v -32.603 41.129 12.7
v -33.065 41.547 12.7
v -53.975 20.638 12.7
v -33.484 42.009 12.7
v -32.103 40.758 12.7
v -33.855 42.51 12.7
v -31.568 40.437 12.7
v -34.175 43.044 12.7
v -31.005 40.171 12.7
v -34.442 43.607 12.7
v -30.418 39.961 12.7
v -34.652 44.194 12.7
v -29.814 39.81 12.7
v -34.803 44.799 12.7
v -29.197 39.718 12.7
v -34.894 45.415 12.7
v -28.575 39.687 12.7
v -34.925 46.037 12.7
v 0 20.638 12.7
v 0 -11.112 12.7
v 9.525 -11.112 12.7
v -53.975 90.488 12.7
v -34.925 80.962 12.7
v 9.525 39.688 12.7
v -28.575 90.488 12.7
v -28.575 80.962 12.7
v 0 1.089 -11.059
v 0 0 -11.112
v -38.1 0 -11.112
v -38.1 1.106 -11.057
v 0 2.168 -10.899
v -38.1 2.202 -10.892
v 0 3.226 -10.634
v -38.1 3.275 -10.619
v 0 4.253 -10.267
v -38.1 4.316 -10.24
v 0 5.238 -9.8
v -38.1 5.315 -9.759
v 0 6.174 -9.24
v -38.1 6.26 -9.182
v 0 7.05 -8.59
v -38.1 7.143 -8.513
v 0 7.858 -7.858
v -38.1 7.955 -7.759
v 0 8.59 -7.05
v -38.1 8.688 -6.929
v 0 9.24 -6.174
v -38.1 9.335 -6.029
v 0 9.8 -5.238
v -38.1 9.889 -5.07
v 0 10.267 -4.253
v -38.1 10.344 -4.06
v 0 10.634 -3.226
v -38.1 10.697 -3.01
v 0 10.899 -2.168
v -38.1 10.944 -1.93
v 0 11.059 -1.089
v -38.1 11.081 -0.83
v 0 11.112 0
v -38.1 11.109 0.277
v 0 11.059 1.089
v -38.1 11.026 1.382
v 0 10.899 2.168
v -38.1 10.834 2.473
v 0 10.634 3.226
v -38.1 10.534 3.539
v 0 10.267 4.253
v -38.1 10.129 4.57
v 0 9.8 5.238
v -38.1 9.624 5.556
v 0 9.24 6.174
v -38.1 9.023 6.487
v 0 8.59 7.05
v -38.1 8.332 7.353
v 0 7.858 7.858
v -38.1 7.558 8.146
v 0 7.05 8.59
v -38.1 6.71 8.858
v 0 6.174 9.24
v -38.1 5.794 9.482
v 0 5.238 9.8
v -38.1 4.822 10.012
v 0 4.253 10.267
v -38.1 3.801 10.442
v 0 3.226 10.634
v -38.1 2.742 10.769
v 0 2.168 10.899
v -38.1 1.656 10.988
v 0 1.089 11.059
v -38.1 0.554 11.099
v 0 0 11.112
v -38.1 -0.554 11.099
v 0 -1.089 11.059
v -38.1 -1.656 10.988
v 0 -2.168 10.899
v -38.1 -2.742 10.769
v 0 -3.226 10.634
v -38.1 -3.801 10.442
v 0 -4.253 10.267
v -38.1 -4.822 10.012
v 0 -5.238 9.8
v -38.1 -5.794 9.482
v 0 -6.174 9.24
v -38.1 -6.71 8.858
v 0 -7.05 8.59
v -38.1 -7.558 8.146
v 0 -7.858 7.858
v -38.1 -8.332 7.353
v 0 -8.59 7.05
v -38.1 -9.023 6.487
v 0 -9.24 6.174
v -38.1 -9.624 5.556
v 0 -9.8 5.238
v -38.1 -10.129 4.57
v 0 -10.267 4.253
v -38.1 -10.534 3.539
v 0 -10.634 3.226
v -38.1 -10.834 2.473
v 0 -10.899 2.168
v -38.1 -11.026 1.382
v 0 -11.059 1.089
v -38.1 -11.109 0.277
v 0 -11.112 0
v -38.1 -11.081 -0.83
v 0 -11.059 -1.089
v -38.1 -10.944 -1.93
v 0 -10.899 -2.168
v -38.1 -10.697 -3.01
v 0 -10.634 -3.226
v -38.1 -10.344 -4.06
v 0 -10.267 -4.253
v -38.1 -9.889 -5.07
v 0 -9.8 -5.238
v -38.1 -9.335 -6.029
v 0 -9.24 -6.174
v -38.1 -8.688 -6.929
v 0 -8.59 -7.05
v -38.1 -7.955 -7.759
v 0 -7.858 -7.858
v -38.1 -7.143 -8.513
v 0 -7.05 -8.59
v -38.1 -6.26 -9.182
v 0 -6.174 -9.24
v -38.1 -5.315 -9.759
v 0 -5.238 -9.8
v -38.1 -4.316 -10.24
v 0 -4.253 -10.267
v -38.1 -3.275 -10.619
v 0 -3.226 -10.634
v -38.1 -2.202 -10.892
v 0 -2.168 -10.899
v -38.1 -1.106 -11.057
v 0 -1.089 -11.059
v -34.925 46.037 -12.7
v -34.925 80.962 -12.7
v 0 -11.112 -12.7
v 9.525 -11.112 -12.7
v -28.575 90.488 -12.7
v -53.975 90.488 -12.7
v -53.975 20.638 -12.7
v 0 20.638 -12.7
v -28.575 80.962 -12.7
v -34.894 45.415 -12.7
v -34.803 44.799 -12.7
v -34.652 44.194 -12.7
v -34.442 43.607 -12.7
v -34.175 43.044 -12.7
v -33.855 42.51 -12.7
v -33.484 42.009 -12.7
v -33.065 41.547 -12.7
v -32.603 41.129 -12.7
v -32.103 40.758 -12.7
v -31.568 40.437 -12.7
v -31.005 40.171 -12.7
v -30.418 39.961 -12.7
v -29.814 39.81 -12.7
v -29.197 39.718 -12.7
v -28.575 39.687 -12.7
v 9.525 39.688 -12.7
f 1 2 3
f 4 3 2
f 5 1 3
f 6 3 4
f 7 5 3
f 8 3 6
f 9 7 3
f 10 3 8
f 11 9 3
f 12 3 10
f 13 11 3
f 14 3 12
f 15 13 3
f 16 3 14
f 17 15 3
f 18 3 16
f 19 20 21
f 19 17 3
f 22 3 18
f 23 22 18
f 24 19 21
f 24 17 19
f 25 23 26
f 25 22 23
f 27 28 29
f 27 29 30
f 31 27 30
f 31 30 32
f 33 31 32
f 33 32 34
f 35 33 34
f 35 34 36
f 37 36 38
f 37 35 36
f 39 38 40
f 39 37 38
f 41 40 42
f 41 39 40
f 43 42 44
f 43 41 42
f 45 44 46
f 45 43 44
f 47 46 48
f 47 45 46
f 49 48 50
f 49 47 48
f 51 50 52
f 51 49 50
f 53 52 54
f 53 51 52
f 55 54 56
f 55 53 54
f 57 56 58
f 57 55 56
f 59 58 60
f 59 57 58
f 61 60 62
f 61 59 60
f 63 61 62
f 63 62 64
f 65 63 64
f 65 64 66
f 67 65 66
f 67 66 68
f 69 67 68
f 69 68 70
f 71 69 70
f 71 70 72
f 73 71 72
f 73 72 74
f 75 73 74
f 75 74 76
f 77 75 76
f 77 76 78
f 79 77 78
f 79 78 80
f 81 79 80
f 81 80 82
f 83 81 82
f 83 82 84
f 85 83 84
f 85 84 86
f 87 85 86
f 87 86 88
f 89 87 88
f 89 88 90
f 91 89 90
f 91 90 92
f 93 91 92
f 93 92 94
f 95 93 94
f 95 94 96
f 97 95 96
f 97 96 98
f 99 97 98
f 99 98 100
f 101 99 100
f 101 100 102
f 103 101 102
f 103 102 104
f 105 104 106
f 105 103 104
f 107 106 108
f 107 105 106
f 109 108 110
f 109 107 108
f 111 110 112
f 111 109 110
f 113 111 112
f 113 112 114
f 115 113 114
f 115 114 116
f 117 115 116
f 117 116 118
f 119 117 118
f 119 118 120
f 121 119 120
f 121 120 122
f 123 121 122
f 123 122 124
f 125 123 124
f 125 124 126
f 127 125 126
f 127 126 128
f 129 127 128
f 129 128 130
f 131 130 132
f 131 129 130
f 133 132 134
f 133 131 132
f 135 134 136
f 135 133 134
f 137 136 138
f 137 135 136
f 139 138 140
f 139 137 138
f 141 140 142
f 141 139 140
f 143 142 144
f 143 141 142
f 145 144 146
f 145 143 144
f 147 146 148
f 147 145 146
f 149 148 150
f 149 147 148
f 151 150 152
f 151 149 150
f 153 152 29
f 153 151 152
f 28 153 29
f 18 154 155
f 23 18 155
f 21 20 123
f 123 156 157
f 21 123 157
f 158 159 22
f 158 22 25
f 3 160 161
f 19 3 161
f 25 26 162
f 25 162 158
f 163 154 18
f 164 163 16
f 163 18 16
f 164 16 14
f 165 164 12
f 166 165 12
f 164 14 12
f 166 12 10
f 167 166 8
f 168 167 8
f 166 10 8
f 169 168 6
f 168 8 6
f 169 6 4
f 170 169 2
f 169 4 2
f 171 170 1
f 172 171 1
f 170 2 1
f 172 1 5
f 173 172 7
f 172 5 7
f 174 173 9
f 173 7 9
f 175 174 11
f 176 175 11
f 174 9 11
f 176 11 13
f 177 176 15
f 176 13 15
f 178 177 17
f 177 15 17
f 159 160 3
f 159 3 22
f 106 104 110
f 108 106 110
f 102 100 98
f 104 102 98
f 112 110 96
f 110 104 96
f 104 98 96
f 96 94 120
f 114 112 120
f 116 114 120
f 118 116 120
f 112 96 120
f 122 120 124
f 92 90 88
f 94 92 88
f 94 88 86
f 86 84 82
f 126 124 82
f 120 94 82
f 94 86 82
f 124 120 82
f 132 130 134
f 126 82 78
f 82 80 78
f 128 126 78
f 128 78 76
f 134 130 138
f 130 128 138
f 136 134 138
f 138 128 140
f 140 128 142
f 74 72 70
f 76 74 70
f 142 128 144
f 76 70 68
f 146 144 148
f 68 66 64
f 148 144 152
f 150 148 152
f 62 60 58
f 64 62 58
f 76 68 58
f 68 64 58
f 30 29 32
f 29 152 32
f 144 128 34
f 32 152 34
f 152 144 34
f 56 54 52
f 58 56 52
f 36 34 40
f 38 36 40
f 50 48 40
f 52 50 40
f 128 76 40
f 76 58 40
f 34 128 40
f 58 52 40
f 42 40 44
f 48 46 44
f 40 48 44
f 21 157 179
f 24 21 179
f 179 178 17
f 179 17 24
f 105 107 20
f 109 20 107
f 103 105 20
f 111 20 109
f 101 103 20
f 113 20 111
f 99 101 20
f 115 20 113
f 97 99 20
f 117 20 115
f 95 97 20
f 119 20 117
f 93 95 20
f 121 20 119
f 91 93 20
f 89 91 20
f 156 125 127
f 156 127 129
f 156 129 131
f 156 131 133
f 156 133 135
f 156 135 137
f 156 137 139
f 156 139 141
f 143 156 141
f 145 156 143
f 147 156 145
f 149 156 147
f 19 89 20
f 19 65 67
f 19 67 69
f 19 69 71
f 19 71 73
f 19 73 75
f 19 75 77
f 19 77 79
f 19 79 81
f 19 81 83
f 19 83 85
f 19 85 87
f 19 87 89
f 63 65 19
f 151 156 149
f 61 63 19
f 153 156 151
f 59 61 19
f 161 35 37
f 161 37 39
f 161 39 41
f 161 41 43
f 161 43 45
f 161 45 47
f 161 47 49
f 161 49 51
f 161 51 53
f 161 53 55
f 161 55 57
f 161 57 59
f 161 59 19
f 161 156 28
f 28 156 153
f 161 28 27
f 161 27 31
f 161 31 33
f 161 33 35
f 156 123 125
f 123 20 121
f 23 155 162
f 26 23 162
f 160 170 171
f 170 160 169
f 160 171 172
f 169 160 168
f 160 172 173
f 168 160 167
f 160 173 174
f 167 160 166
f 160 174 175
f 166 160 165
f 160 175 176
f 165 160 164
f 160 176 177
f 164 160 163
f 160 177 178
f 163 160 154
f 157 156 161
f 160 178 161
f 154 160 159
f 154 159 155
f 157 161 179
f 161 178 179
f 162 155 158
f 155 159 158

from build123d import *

# Parameters (mm, degrees)
SKETCH1_R                = 11.1125
BOSS_EXTRUDE1_DEPTH      = 38.1
BOSS_EXTRUDE2_DEPTH      = 12.7
BOSS_EXTRUDE2_DEPTH_BACK = 12.7
SKETCH2_W                = 9.525
SKETCH2_H                = 31.75
BOSS_EXTRUDE3_DEPTH      = 12.7
BOSS_EXTRUDE3_DEPTH_BACK = 12.7
SKETCH3_W                = 63.5
SKETCH3_H                = 19.05
BOSS_EXTRUDE4_DEPTH      = 12.7
BOSS_EXTRUDE4_DEPTH_BACK = 12.7
SKETCH4_W                = 19.05
SKETCH4_H                = 69.85
BOSS_EXTRUDE5_DEPTH      = 12.7
BOSS_EXTRUDE5_DEPTH_BACK = 12.7
FILLET1_R                = 6.35


with BuildPart() as part:
    # Sketch1 → Boss-Extrude1 (new body)
    with BuildSketch(Plane(origin=(0, 0, 0), x_dir=(0, 0, -1), z_dir=(1, 0, 0))):
        Circle(SKETCH1_R)
    extrude(amount=-BOSS_EXTRUDE1_DEPTH)

    # Sketch2 → Boss-Extrude2 (add, two sides: drawn at the far end of the back side and taken through both)
    with BuildSketch(Plane.XY.offset(-BOSS_EXTRUDE2_DEPTH_BACK)):
        with Locations((4.7625, 4.7625)):
            Rectangle(SKETCH2_W, SKETCH2_H)
    extrude(amount=BOSS_EXTRUDE2_DEPTH + BOSS_EXTRUDE2_DEPTH_BACK)

    # Sketch3 → Boss-Extrude3 (add, two sides: drawn at the far end of the back side and taken through both)
    with BuildSketch(Plane.XY.offset(-BOSS_EXTRUDE3_DEPTH_BACK)):
        with Locations((-22.225, 30.1625)):
            Rectangle(SKETCH3_W, SKETCH3_H)
    extrude(amount=BOSS_EXTRUDE3_DEPTH + BOSS_EXTRUDE3_DEPTH_BACK)

    # Sketch4 → Boss-Extrude4 (add, two sides: drawn at the far end of the back side and taken through both)
    with BuildSketch(Plane.XY.offset(-BOSS_EXTRUDE4_DEPTH_BACK)):
        with Locations((-44.45, 55.5625)):
            Rectangle(SKETCH4_W, SKETCH4_H)
    extrude(amount=BOSS_EXTRUDE4_DEPTH + BOSS_EXTRUDE4_DEPTH_BACK)

    # Sketch5 → Boss-Extrude5 (add, two sides: drawn at the far end of the back side and taken through both)
    with BuildSketch(Plane.XY.offset(-BOSS_EXTRUDE5_DEPTH_BACK)):
        Polygon((-53.975, 77.7875), (-41.23944, 77.7875), (-41.23944, 80.9625), (-28.575, 80.9625), (-28.575, 90.4875), (-53.975, 90.4875), align=None)
    extrude(amount=BOSS_EXTRUDE5_DEPTH + BOSS_EXTRUDE5_DEPTH_BACK)

    # Fillet1
    fillet1_edges = [part.edges().sort_by_distance(p)[0] for p in [
        (-34.925, 39.6875, 0),
    ]]
    fillet(fillet1_edges, radius=FILLET1_R)


solid = part.part
